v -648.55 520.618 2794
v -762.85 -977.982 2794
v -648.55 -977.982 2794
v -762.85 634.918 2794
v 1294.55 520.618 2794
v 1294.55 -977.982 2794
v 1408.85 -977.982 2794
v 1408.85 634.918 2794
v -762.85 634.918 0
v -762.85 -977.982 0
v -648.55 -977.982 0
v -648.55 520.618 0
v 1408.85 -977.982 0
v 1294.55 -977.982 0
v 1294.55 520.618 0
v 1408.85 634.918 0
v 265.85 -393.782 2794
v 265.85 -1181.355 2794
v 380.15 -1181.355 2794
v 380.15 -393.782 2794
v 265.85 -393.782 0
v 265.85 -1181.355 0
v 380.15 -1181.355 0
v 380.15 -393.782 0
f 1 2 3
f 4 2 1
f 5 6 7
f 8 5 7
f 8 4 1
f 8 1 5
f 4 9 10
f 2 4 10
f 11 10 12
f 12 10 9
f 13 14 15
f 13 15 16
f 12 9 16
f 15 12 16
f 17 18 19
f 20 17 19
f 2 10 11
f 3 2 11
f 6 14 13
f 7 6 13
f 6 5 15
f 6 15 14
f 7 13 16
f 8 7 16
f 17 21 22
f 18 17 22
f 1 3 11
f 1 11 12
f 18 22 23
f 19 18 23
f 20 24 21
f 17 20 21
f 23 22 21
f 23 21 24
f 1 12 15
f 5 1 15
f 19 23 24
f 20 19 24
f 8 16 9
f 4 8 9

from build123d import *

# Parameters (mm, degrees)
F1_DEPTH = 2794


with BuildPart() as f1:
    # F0 (on Top) → F1 (new body)
    with BuildSketch(Plane.XY):
        Polygon((-648.549602, -977.982418), (-648.549602, 520.617582), (323.000398, 520.617582), (1294.550398, 520.617582), (1294.550398, -977.982418), (1408.850398, -977.982418), (1408.850398, 634.917582), (-762.849602, 634.917582), (-762.849602, -977.982418), align=None)
        Polygon((380.150398, -393.782418), (323.000398, -393.782418), (265.850398, -393.782418), (265.850398, -1181.354523), (380.150398, -1181.354523), align=None)
    extrude(amount=F1_DEPTH)


solid = f1.part
